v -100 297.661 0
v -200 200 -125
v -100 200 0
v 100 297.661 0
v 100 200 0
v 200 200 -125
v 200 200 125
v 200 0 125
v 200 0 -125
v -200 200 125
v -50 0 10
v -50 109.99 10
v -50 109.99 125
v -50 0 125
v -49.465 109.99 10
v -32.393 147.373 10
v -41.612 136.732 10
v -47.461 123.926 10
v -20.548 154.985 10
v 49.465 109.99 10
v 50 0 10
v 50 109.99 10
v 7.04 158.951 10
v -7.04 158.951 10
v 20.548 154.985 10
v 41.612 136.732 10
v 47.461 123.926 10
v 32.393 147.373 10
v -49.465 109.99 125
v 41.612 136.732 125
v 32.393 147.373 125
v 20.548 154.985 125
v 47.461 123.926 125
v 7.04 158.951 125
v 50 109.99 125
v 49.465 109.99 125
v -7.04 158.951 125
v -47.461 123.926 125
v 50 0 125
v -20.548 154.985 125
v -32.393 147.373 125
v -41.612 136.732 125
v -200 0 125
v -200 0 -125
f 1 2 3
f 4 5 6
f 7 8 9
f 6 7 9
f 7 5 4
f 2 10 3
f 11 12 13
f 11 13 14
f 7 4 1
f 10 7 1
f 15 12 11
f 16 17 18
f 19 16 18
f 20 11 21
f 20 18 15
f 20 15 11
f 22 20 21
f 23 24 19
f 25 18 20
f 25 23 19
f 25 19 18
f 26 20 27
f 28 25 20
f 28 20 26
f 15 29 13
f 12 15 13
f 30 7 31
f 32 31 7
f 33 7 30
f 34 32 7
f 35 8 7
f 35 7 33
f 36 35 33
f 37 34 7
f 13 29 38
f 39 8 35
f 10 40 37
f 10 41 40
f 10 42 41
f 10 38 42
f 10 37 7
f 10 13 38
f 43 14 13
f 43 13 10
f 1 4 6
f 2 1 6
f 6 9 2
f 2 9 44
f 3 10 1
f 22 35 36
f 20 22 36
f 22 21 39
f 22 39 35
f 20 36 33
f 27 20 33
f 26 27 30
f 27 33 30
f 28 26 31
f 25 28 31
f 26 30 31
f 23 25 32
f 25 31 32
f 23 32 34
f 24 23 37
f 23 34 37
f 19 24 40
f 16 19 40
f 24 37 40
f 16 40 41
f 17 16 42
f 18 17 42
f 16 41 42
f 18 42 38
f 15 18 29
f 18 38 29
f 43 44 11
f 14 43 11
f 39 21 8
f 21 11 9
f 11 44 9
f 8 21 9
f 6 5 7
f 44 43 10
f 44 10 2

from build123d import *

# Parameters (mm, degrees)
CROQUIS1_W              = 400
CROQUIS1_H              = 250
SALIENTE_EXTRUIR1_DEPTH = 200
CORTAR_EXTRUIR1_DEPTH   = 115
SALIENTE_EXTRUIR2_DEPTH = 100
CHAFL_N1_SIZE           = 100
CHAFL_N1_SIZE2          = 127.994163219
CHAFL_N2_SIZE           = 127.994163219
CHAFL_N2_SIZE_2         = 100


with BuildPart() as part:
    # Croquis1 → Saliente-Extruir1 (new body)
    with BuildSketch(Plane(origin=(0, 0, 0), x_dir=(1, 0, 0), z_dir=(0, 1, 0))):
        Rectangle(CROQUIS1_W, CROQUIS1_H)
    extrude(amount=SALIENTE_EXTRUIR1_DEPTH)

    # Croquis2 → Cortar-Extruir1 (cut)
    with BuildSketch(Plane.XY.offset(125)):
        with BuildLine():
            Line((-50, 0), (50, 0))
            Line((50, 0), (50, 109.989754524))
            Line((50, 109.989754524), (49.464803301, 109.989754524))
            ThreePointArc((49.464803301, 109.989754524), (0, 159.454557825), (-49.464803301, 109.989754524))
            Line((-49.464803301, 109.989754524), (-50, 109.989754524))
            Line((-50, 109.989754524), (-50, 0))
        make_face()
    extrude(amount=-CORTAR_EXTRUIR1_DEPTH, mode=Mode.SUBTRACT)

    # Croquis4 → Saliente-Extruir2 (add)
    with BuildSketch(Plane(origin=(0, 200, 0), x_dir=(1, 0, 0), z_dir=(0, 1, 0))):
        Polygon((-200, 125), (-100, 0), (100, 0), (200, 125), align=None)
        Polygon((-100, 0), (100, 0), (200, -125), (-200, -125), align=None)
    extrude(amount=SALIENTE_EXTRUIR2_DEPTH)

    # Chaflán1
    chafl_n1_edges = [part.edges().sort_by_distance(p)[0] for p in [
        (0, 300, 125),
    ]]
    chafl_n1_side = [part.faces().sort_by_distance(p)[0] for p in [
        (0, 160.632106787, 125),
    ]]
    chamfer(chafl_n1_edges, length=CHAFL_N1_SIZE, length2=CHAFL_N1_SIZE2, reference=chafl_n1_side[0])

    # Chaflán2
    # the kernel refuses this chamfer: 127.994163219, 100 mm, written as the material it takes off along each edge
    with BuildSketch(Plane(origin=(530.165536966, 300, -125), x_dir=(0, 0.023867141339117125, 0.9997151392093142), z_dir=(-1, 0, 0))) as chafl_n2_piece_1:
        Polygon((CHAFL_N2_SIZE * 0.999715139212, -CHAFL_N2_SIZE * 0.0238671413392), (-CHAFL_N2_SIZE_2 * 0.0238671413391, -CHAFL_N2_SIZE_2 * 0.999715139209), (0, 0), align=None)
    extrude(amount=1060.331073932, mode=Mode.SUBTRACT)


solid = part.part
